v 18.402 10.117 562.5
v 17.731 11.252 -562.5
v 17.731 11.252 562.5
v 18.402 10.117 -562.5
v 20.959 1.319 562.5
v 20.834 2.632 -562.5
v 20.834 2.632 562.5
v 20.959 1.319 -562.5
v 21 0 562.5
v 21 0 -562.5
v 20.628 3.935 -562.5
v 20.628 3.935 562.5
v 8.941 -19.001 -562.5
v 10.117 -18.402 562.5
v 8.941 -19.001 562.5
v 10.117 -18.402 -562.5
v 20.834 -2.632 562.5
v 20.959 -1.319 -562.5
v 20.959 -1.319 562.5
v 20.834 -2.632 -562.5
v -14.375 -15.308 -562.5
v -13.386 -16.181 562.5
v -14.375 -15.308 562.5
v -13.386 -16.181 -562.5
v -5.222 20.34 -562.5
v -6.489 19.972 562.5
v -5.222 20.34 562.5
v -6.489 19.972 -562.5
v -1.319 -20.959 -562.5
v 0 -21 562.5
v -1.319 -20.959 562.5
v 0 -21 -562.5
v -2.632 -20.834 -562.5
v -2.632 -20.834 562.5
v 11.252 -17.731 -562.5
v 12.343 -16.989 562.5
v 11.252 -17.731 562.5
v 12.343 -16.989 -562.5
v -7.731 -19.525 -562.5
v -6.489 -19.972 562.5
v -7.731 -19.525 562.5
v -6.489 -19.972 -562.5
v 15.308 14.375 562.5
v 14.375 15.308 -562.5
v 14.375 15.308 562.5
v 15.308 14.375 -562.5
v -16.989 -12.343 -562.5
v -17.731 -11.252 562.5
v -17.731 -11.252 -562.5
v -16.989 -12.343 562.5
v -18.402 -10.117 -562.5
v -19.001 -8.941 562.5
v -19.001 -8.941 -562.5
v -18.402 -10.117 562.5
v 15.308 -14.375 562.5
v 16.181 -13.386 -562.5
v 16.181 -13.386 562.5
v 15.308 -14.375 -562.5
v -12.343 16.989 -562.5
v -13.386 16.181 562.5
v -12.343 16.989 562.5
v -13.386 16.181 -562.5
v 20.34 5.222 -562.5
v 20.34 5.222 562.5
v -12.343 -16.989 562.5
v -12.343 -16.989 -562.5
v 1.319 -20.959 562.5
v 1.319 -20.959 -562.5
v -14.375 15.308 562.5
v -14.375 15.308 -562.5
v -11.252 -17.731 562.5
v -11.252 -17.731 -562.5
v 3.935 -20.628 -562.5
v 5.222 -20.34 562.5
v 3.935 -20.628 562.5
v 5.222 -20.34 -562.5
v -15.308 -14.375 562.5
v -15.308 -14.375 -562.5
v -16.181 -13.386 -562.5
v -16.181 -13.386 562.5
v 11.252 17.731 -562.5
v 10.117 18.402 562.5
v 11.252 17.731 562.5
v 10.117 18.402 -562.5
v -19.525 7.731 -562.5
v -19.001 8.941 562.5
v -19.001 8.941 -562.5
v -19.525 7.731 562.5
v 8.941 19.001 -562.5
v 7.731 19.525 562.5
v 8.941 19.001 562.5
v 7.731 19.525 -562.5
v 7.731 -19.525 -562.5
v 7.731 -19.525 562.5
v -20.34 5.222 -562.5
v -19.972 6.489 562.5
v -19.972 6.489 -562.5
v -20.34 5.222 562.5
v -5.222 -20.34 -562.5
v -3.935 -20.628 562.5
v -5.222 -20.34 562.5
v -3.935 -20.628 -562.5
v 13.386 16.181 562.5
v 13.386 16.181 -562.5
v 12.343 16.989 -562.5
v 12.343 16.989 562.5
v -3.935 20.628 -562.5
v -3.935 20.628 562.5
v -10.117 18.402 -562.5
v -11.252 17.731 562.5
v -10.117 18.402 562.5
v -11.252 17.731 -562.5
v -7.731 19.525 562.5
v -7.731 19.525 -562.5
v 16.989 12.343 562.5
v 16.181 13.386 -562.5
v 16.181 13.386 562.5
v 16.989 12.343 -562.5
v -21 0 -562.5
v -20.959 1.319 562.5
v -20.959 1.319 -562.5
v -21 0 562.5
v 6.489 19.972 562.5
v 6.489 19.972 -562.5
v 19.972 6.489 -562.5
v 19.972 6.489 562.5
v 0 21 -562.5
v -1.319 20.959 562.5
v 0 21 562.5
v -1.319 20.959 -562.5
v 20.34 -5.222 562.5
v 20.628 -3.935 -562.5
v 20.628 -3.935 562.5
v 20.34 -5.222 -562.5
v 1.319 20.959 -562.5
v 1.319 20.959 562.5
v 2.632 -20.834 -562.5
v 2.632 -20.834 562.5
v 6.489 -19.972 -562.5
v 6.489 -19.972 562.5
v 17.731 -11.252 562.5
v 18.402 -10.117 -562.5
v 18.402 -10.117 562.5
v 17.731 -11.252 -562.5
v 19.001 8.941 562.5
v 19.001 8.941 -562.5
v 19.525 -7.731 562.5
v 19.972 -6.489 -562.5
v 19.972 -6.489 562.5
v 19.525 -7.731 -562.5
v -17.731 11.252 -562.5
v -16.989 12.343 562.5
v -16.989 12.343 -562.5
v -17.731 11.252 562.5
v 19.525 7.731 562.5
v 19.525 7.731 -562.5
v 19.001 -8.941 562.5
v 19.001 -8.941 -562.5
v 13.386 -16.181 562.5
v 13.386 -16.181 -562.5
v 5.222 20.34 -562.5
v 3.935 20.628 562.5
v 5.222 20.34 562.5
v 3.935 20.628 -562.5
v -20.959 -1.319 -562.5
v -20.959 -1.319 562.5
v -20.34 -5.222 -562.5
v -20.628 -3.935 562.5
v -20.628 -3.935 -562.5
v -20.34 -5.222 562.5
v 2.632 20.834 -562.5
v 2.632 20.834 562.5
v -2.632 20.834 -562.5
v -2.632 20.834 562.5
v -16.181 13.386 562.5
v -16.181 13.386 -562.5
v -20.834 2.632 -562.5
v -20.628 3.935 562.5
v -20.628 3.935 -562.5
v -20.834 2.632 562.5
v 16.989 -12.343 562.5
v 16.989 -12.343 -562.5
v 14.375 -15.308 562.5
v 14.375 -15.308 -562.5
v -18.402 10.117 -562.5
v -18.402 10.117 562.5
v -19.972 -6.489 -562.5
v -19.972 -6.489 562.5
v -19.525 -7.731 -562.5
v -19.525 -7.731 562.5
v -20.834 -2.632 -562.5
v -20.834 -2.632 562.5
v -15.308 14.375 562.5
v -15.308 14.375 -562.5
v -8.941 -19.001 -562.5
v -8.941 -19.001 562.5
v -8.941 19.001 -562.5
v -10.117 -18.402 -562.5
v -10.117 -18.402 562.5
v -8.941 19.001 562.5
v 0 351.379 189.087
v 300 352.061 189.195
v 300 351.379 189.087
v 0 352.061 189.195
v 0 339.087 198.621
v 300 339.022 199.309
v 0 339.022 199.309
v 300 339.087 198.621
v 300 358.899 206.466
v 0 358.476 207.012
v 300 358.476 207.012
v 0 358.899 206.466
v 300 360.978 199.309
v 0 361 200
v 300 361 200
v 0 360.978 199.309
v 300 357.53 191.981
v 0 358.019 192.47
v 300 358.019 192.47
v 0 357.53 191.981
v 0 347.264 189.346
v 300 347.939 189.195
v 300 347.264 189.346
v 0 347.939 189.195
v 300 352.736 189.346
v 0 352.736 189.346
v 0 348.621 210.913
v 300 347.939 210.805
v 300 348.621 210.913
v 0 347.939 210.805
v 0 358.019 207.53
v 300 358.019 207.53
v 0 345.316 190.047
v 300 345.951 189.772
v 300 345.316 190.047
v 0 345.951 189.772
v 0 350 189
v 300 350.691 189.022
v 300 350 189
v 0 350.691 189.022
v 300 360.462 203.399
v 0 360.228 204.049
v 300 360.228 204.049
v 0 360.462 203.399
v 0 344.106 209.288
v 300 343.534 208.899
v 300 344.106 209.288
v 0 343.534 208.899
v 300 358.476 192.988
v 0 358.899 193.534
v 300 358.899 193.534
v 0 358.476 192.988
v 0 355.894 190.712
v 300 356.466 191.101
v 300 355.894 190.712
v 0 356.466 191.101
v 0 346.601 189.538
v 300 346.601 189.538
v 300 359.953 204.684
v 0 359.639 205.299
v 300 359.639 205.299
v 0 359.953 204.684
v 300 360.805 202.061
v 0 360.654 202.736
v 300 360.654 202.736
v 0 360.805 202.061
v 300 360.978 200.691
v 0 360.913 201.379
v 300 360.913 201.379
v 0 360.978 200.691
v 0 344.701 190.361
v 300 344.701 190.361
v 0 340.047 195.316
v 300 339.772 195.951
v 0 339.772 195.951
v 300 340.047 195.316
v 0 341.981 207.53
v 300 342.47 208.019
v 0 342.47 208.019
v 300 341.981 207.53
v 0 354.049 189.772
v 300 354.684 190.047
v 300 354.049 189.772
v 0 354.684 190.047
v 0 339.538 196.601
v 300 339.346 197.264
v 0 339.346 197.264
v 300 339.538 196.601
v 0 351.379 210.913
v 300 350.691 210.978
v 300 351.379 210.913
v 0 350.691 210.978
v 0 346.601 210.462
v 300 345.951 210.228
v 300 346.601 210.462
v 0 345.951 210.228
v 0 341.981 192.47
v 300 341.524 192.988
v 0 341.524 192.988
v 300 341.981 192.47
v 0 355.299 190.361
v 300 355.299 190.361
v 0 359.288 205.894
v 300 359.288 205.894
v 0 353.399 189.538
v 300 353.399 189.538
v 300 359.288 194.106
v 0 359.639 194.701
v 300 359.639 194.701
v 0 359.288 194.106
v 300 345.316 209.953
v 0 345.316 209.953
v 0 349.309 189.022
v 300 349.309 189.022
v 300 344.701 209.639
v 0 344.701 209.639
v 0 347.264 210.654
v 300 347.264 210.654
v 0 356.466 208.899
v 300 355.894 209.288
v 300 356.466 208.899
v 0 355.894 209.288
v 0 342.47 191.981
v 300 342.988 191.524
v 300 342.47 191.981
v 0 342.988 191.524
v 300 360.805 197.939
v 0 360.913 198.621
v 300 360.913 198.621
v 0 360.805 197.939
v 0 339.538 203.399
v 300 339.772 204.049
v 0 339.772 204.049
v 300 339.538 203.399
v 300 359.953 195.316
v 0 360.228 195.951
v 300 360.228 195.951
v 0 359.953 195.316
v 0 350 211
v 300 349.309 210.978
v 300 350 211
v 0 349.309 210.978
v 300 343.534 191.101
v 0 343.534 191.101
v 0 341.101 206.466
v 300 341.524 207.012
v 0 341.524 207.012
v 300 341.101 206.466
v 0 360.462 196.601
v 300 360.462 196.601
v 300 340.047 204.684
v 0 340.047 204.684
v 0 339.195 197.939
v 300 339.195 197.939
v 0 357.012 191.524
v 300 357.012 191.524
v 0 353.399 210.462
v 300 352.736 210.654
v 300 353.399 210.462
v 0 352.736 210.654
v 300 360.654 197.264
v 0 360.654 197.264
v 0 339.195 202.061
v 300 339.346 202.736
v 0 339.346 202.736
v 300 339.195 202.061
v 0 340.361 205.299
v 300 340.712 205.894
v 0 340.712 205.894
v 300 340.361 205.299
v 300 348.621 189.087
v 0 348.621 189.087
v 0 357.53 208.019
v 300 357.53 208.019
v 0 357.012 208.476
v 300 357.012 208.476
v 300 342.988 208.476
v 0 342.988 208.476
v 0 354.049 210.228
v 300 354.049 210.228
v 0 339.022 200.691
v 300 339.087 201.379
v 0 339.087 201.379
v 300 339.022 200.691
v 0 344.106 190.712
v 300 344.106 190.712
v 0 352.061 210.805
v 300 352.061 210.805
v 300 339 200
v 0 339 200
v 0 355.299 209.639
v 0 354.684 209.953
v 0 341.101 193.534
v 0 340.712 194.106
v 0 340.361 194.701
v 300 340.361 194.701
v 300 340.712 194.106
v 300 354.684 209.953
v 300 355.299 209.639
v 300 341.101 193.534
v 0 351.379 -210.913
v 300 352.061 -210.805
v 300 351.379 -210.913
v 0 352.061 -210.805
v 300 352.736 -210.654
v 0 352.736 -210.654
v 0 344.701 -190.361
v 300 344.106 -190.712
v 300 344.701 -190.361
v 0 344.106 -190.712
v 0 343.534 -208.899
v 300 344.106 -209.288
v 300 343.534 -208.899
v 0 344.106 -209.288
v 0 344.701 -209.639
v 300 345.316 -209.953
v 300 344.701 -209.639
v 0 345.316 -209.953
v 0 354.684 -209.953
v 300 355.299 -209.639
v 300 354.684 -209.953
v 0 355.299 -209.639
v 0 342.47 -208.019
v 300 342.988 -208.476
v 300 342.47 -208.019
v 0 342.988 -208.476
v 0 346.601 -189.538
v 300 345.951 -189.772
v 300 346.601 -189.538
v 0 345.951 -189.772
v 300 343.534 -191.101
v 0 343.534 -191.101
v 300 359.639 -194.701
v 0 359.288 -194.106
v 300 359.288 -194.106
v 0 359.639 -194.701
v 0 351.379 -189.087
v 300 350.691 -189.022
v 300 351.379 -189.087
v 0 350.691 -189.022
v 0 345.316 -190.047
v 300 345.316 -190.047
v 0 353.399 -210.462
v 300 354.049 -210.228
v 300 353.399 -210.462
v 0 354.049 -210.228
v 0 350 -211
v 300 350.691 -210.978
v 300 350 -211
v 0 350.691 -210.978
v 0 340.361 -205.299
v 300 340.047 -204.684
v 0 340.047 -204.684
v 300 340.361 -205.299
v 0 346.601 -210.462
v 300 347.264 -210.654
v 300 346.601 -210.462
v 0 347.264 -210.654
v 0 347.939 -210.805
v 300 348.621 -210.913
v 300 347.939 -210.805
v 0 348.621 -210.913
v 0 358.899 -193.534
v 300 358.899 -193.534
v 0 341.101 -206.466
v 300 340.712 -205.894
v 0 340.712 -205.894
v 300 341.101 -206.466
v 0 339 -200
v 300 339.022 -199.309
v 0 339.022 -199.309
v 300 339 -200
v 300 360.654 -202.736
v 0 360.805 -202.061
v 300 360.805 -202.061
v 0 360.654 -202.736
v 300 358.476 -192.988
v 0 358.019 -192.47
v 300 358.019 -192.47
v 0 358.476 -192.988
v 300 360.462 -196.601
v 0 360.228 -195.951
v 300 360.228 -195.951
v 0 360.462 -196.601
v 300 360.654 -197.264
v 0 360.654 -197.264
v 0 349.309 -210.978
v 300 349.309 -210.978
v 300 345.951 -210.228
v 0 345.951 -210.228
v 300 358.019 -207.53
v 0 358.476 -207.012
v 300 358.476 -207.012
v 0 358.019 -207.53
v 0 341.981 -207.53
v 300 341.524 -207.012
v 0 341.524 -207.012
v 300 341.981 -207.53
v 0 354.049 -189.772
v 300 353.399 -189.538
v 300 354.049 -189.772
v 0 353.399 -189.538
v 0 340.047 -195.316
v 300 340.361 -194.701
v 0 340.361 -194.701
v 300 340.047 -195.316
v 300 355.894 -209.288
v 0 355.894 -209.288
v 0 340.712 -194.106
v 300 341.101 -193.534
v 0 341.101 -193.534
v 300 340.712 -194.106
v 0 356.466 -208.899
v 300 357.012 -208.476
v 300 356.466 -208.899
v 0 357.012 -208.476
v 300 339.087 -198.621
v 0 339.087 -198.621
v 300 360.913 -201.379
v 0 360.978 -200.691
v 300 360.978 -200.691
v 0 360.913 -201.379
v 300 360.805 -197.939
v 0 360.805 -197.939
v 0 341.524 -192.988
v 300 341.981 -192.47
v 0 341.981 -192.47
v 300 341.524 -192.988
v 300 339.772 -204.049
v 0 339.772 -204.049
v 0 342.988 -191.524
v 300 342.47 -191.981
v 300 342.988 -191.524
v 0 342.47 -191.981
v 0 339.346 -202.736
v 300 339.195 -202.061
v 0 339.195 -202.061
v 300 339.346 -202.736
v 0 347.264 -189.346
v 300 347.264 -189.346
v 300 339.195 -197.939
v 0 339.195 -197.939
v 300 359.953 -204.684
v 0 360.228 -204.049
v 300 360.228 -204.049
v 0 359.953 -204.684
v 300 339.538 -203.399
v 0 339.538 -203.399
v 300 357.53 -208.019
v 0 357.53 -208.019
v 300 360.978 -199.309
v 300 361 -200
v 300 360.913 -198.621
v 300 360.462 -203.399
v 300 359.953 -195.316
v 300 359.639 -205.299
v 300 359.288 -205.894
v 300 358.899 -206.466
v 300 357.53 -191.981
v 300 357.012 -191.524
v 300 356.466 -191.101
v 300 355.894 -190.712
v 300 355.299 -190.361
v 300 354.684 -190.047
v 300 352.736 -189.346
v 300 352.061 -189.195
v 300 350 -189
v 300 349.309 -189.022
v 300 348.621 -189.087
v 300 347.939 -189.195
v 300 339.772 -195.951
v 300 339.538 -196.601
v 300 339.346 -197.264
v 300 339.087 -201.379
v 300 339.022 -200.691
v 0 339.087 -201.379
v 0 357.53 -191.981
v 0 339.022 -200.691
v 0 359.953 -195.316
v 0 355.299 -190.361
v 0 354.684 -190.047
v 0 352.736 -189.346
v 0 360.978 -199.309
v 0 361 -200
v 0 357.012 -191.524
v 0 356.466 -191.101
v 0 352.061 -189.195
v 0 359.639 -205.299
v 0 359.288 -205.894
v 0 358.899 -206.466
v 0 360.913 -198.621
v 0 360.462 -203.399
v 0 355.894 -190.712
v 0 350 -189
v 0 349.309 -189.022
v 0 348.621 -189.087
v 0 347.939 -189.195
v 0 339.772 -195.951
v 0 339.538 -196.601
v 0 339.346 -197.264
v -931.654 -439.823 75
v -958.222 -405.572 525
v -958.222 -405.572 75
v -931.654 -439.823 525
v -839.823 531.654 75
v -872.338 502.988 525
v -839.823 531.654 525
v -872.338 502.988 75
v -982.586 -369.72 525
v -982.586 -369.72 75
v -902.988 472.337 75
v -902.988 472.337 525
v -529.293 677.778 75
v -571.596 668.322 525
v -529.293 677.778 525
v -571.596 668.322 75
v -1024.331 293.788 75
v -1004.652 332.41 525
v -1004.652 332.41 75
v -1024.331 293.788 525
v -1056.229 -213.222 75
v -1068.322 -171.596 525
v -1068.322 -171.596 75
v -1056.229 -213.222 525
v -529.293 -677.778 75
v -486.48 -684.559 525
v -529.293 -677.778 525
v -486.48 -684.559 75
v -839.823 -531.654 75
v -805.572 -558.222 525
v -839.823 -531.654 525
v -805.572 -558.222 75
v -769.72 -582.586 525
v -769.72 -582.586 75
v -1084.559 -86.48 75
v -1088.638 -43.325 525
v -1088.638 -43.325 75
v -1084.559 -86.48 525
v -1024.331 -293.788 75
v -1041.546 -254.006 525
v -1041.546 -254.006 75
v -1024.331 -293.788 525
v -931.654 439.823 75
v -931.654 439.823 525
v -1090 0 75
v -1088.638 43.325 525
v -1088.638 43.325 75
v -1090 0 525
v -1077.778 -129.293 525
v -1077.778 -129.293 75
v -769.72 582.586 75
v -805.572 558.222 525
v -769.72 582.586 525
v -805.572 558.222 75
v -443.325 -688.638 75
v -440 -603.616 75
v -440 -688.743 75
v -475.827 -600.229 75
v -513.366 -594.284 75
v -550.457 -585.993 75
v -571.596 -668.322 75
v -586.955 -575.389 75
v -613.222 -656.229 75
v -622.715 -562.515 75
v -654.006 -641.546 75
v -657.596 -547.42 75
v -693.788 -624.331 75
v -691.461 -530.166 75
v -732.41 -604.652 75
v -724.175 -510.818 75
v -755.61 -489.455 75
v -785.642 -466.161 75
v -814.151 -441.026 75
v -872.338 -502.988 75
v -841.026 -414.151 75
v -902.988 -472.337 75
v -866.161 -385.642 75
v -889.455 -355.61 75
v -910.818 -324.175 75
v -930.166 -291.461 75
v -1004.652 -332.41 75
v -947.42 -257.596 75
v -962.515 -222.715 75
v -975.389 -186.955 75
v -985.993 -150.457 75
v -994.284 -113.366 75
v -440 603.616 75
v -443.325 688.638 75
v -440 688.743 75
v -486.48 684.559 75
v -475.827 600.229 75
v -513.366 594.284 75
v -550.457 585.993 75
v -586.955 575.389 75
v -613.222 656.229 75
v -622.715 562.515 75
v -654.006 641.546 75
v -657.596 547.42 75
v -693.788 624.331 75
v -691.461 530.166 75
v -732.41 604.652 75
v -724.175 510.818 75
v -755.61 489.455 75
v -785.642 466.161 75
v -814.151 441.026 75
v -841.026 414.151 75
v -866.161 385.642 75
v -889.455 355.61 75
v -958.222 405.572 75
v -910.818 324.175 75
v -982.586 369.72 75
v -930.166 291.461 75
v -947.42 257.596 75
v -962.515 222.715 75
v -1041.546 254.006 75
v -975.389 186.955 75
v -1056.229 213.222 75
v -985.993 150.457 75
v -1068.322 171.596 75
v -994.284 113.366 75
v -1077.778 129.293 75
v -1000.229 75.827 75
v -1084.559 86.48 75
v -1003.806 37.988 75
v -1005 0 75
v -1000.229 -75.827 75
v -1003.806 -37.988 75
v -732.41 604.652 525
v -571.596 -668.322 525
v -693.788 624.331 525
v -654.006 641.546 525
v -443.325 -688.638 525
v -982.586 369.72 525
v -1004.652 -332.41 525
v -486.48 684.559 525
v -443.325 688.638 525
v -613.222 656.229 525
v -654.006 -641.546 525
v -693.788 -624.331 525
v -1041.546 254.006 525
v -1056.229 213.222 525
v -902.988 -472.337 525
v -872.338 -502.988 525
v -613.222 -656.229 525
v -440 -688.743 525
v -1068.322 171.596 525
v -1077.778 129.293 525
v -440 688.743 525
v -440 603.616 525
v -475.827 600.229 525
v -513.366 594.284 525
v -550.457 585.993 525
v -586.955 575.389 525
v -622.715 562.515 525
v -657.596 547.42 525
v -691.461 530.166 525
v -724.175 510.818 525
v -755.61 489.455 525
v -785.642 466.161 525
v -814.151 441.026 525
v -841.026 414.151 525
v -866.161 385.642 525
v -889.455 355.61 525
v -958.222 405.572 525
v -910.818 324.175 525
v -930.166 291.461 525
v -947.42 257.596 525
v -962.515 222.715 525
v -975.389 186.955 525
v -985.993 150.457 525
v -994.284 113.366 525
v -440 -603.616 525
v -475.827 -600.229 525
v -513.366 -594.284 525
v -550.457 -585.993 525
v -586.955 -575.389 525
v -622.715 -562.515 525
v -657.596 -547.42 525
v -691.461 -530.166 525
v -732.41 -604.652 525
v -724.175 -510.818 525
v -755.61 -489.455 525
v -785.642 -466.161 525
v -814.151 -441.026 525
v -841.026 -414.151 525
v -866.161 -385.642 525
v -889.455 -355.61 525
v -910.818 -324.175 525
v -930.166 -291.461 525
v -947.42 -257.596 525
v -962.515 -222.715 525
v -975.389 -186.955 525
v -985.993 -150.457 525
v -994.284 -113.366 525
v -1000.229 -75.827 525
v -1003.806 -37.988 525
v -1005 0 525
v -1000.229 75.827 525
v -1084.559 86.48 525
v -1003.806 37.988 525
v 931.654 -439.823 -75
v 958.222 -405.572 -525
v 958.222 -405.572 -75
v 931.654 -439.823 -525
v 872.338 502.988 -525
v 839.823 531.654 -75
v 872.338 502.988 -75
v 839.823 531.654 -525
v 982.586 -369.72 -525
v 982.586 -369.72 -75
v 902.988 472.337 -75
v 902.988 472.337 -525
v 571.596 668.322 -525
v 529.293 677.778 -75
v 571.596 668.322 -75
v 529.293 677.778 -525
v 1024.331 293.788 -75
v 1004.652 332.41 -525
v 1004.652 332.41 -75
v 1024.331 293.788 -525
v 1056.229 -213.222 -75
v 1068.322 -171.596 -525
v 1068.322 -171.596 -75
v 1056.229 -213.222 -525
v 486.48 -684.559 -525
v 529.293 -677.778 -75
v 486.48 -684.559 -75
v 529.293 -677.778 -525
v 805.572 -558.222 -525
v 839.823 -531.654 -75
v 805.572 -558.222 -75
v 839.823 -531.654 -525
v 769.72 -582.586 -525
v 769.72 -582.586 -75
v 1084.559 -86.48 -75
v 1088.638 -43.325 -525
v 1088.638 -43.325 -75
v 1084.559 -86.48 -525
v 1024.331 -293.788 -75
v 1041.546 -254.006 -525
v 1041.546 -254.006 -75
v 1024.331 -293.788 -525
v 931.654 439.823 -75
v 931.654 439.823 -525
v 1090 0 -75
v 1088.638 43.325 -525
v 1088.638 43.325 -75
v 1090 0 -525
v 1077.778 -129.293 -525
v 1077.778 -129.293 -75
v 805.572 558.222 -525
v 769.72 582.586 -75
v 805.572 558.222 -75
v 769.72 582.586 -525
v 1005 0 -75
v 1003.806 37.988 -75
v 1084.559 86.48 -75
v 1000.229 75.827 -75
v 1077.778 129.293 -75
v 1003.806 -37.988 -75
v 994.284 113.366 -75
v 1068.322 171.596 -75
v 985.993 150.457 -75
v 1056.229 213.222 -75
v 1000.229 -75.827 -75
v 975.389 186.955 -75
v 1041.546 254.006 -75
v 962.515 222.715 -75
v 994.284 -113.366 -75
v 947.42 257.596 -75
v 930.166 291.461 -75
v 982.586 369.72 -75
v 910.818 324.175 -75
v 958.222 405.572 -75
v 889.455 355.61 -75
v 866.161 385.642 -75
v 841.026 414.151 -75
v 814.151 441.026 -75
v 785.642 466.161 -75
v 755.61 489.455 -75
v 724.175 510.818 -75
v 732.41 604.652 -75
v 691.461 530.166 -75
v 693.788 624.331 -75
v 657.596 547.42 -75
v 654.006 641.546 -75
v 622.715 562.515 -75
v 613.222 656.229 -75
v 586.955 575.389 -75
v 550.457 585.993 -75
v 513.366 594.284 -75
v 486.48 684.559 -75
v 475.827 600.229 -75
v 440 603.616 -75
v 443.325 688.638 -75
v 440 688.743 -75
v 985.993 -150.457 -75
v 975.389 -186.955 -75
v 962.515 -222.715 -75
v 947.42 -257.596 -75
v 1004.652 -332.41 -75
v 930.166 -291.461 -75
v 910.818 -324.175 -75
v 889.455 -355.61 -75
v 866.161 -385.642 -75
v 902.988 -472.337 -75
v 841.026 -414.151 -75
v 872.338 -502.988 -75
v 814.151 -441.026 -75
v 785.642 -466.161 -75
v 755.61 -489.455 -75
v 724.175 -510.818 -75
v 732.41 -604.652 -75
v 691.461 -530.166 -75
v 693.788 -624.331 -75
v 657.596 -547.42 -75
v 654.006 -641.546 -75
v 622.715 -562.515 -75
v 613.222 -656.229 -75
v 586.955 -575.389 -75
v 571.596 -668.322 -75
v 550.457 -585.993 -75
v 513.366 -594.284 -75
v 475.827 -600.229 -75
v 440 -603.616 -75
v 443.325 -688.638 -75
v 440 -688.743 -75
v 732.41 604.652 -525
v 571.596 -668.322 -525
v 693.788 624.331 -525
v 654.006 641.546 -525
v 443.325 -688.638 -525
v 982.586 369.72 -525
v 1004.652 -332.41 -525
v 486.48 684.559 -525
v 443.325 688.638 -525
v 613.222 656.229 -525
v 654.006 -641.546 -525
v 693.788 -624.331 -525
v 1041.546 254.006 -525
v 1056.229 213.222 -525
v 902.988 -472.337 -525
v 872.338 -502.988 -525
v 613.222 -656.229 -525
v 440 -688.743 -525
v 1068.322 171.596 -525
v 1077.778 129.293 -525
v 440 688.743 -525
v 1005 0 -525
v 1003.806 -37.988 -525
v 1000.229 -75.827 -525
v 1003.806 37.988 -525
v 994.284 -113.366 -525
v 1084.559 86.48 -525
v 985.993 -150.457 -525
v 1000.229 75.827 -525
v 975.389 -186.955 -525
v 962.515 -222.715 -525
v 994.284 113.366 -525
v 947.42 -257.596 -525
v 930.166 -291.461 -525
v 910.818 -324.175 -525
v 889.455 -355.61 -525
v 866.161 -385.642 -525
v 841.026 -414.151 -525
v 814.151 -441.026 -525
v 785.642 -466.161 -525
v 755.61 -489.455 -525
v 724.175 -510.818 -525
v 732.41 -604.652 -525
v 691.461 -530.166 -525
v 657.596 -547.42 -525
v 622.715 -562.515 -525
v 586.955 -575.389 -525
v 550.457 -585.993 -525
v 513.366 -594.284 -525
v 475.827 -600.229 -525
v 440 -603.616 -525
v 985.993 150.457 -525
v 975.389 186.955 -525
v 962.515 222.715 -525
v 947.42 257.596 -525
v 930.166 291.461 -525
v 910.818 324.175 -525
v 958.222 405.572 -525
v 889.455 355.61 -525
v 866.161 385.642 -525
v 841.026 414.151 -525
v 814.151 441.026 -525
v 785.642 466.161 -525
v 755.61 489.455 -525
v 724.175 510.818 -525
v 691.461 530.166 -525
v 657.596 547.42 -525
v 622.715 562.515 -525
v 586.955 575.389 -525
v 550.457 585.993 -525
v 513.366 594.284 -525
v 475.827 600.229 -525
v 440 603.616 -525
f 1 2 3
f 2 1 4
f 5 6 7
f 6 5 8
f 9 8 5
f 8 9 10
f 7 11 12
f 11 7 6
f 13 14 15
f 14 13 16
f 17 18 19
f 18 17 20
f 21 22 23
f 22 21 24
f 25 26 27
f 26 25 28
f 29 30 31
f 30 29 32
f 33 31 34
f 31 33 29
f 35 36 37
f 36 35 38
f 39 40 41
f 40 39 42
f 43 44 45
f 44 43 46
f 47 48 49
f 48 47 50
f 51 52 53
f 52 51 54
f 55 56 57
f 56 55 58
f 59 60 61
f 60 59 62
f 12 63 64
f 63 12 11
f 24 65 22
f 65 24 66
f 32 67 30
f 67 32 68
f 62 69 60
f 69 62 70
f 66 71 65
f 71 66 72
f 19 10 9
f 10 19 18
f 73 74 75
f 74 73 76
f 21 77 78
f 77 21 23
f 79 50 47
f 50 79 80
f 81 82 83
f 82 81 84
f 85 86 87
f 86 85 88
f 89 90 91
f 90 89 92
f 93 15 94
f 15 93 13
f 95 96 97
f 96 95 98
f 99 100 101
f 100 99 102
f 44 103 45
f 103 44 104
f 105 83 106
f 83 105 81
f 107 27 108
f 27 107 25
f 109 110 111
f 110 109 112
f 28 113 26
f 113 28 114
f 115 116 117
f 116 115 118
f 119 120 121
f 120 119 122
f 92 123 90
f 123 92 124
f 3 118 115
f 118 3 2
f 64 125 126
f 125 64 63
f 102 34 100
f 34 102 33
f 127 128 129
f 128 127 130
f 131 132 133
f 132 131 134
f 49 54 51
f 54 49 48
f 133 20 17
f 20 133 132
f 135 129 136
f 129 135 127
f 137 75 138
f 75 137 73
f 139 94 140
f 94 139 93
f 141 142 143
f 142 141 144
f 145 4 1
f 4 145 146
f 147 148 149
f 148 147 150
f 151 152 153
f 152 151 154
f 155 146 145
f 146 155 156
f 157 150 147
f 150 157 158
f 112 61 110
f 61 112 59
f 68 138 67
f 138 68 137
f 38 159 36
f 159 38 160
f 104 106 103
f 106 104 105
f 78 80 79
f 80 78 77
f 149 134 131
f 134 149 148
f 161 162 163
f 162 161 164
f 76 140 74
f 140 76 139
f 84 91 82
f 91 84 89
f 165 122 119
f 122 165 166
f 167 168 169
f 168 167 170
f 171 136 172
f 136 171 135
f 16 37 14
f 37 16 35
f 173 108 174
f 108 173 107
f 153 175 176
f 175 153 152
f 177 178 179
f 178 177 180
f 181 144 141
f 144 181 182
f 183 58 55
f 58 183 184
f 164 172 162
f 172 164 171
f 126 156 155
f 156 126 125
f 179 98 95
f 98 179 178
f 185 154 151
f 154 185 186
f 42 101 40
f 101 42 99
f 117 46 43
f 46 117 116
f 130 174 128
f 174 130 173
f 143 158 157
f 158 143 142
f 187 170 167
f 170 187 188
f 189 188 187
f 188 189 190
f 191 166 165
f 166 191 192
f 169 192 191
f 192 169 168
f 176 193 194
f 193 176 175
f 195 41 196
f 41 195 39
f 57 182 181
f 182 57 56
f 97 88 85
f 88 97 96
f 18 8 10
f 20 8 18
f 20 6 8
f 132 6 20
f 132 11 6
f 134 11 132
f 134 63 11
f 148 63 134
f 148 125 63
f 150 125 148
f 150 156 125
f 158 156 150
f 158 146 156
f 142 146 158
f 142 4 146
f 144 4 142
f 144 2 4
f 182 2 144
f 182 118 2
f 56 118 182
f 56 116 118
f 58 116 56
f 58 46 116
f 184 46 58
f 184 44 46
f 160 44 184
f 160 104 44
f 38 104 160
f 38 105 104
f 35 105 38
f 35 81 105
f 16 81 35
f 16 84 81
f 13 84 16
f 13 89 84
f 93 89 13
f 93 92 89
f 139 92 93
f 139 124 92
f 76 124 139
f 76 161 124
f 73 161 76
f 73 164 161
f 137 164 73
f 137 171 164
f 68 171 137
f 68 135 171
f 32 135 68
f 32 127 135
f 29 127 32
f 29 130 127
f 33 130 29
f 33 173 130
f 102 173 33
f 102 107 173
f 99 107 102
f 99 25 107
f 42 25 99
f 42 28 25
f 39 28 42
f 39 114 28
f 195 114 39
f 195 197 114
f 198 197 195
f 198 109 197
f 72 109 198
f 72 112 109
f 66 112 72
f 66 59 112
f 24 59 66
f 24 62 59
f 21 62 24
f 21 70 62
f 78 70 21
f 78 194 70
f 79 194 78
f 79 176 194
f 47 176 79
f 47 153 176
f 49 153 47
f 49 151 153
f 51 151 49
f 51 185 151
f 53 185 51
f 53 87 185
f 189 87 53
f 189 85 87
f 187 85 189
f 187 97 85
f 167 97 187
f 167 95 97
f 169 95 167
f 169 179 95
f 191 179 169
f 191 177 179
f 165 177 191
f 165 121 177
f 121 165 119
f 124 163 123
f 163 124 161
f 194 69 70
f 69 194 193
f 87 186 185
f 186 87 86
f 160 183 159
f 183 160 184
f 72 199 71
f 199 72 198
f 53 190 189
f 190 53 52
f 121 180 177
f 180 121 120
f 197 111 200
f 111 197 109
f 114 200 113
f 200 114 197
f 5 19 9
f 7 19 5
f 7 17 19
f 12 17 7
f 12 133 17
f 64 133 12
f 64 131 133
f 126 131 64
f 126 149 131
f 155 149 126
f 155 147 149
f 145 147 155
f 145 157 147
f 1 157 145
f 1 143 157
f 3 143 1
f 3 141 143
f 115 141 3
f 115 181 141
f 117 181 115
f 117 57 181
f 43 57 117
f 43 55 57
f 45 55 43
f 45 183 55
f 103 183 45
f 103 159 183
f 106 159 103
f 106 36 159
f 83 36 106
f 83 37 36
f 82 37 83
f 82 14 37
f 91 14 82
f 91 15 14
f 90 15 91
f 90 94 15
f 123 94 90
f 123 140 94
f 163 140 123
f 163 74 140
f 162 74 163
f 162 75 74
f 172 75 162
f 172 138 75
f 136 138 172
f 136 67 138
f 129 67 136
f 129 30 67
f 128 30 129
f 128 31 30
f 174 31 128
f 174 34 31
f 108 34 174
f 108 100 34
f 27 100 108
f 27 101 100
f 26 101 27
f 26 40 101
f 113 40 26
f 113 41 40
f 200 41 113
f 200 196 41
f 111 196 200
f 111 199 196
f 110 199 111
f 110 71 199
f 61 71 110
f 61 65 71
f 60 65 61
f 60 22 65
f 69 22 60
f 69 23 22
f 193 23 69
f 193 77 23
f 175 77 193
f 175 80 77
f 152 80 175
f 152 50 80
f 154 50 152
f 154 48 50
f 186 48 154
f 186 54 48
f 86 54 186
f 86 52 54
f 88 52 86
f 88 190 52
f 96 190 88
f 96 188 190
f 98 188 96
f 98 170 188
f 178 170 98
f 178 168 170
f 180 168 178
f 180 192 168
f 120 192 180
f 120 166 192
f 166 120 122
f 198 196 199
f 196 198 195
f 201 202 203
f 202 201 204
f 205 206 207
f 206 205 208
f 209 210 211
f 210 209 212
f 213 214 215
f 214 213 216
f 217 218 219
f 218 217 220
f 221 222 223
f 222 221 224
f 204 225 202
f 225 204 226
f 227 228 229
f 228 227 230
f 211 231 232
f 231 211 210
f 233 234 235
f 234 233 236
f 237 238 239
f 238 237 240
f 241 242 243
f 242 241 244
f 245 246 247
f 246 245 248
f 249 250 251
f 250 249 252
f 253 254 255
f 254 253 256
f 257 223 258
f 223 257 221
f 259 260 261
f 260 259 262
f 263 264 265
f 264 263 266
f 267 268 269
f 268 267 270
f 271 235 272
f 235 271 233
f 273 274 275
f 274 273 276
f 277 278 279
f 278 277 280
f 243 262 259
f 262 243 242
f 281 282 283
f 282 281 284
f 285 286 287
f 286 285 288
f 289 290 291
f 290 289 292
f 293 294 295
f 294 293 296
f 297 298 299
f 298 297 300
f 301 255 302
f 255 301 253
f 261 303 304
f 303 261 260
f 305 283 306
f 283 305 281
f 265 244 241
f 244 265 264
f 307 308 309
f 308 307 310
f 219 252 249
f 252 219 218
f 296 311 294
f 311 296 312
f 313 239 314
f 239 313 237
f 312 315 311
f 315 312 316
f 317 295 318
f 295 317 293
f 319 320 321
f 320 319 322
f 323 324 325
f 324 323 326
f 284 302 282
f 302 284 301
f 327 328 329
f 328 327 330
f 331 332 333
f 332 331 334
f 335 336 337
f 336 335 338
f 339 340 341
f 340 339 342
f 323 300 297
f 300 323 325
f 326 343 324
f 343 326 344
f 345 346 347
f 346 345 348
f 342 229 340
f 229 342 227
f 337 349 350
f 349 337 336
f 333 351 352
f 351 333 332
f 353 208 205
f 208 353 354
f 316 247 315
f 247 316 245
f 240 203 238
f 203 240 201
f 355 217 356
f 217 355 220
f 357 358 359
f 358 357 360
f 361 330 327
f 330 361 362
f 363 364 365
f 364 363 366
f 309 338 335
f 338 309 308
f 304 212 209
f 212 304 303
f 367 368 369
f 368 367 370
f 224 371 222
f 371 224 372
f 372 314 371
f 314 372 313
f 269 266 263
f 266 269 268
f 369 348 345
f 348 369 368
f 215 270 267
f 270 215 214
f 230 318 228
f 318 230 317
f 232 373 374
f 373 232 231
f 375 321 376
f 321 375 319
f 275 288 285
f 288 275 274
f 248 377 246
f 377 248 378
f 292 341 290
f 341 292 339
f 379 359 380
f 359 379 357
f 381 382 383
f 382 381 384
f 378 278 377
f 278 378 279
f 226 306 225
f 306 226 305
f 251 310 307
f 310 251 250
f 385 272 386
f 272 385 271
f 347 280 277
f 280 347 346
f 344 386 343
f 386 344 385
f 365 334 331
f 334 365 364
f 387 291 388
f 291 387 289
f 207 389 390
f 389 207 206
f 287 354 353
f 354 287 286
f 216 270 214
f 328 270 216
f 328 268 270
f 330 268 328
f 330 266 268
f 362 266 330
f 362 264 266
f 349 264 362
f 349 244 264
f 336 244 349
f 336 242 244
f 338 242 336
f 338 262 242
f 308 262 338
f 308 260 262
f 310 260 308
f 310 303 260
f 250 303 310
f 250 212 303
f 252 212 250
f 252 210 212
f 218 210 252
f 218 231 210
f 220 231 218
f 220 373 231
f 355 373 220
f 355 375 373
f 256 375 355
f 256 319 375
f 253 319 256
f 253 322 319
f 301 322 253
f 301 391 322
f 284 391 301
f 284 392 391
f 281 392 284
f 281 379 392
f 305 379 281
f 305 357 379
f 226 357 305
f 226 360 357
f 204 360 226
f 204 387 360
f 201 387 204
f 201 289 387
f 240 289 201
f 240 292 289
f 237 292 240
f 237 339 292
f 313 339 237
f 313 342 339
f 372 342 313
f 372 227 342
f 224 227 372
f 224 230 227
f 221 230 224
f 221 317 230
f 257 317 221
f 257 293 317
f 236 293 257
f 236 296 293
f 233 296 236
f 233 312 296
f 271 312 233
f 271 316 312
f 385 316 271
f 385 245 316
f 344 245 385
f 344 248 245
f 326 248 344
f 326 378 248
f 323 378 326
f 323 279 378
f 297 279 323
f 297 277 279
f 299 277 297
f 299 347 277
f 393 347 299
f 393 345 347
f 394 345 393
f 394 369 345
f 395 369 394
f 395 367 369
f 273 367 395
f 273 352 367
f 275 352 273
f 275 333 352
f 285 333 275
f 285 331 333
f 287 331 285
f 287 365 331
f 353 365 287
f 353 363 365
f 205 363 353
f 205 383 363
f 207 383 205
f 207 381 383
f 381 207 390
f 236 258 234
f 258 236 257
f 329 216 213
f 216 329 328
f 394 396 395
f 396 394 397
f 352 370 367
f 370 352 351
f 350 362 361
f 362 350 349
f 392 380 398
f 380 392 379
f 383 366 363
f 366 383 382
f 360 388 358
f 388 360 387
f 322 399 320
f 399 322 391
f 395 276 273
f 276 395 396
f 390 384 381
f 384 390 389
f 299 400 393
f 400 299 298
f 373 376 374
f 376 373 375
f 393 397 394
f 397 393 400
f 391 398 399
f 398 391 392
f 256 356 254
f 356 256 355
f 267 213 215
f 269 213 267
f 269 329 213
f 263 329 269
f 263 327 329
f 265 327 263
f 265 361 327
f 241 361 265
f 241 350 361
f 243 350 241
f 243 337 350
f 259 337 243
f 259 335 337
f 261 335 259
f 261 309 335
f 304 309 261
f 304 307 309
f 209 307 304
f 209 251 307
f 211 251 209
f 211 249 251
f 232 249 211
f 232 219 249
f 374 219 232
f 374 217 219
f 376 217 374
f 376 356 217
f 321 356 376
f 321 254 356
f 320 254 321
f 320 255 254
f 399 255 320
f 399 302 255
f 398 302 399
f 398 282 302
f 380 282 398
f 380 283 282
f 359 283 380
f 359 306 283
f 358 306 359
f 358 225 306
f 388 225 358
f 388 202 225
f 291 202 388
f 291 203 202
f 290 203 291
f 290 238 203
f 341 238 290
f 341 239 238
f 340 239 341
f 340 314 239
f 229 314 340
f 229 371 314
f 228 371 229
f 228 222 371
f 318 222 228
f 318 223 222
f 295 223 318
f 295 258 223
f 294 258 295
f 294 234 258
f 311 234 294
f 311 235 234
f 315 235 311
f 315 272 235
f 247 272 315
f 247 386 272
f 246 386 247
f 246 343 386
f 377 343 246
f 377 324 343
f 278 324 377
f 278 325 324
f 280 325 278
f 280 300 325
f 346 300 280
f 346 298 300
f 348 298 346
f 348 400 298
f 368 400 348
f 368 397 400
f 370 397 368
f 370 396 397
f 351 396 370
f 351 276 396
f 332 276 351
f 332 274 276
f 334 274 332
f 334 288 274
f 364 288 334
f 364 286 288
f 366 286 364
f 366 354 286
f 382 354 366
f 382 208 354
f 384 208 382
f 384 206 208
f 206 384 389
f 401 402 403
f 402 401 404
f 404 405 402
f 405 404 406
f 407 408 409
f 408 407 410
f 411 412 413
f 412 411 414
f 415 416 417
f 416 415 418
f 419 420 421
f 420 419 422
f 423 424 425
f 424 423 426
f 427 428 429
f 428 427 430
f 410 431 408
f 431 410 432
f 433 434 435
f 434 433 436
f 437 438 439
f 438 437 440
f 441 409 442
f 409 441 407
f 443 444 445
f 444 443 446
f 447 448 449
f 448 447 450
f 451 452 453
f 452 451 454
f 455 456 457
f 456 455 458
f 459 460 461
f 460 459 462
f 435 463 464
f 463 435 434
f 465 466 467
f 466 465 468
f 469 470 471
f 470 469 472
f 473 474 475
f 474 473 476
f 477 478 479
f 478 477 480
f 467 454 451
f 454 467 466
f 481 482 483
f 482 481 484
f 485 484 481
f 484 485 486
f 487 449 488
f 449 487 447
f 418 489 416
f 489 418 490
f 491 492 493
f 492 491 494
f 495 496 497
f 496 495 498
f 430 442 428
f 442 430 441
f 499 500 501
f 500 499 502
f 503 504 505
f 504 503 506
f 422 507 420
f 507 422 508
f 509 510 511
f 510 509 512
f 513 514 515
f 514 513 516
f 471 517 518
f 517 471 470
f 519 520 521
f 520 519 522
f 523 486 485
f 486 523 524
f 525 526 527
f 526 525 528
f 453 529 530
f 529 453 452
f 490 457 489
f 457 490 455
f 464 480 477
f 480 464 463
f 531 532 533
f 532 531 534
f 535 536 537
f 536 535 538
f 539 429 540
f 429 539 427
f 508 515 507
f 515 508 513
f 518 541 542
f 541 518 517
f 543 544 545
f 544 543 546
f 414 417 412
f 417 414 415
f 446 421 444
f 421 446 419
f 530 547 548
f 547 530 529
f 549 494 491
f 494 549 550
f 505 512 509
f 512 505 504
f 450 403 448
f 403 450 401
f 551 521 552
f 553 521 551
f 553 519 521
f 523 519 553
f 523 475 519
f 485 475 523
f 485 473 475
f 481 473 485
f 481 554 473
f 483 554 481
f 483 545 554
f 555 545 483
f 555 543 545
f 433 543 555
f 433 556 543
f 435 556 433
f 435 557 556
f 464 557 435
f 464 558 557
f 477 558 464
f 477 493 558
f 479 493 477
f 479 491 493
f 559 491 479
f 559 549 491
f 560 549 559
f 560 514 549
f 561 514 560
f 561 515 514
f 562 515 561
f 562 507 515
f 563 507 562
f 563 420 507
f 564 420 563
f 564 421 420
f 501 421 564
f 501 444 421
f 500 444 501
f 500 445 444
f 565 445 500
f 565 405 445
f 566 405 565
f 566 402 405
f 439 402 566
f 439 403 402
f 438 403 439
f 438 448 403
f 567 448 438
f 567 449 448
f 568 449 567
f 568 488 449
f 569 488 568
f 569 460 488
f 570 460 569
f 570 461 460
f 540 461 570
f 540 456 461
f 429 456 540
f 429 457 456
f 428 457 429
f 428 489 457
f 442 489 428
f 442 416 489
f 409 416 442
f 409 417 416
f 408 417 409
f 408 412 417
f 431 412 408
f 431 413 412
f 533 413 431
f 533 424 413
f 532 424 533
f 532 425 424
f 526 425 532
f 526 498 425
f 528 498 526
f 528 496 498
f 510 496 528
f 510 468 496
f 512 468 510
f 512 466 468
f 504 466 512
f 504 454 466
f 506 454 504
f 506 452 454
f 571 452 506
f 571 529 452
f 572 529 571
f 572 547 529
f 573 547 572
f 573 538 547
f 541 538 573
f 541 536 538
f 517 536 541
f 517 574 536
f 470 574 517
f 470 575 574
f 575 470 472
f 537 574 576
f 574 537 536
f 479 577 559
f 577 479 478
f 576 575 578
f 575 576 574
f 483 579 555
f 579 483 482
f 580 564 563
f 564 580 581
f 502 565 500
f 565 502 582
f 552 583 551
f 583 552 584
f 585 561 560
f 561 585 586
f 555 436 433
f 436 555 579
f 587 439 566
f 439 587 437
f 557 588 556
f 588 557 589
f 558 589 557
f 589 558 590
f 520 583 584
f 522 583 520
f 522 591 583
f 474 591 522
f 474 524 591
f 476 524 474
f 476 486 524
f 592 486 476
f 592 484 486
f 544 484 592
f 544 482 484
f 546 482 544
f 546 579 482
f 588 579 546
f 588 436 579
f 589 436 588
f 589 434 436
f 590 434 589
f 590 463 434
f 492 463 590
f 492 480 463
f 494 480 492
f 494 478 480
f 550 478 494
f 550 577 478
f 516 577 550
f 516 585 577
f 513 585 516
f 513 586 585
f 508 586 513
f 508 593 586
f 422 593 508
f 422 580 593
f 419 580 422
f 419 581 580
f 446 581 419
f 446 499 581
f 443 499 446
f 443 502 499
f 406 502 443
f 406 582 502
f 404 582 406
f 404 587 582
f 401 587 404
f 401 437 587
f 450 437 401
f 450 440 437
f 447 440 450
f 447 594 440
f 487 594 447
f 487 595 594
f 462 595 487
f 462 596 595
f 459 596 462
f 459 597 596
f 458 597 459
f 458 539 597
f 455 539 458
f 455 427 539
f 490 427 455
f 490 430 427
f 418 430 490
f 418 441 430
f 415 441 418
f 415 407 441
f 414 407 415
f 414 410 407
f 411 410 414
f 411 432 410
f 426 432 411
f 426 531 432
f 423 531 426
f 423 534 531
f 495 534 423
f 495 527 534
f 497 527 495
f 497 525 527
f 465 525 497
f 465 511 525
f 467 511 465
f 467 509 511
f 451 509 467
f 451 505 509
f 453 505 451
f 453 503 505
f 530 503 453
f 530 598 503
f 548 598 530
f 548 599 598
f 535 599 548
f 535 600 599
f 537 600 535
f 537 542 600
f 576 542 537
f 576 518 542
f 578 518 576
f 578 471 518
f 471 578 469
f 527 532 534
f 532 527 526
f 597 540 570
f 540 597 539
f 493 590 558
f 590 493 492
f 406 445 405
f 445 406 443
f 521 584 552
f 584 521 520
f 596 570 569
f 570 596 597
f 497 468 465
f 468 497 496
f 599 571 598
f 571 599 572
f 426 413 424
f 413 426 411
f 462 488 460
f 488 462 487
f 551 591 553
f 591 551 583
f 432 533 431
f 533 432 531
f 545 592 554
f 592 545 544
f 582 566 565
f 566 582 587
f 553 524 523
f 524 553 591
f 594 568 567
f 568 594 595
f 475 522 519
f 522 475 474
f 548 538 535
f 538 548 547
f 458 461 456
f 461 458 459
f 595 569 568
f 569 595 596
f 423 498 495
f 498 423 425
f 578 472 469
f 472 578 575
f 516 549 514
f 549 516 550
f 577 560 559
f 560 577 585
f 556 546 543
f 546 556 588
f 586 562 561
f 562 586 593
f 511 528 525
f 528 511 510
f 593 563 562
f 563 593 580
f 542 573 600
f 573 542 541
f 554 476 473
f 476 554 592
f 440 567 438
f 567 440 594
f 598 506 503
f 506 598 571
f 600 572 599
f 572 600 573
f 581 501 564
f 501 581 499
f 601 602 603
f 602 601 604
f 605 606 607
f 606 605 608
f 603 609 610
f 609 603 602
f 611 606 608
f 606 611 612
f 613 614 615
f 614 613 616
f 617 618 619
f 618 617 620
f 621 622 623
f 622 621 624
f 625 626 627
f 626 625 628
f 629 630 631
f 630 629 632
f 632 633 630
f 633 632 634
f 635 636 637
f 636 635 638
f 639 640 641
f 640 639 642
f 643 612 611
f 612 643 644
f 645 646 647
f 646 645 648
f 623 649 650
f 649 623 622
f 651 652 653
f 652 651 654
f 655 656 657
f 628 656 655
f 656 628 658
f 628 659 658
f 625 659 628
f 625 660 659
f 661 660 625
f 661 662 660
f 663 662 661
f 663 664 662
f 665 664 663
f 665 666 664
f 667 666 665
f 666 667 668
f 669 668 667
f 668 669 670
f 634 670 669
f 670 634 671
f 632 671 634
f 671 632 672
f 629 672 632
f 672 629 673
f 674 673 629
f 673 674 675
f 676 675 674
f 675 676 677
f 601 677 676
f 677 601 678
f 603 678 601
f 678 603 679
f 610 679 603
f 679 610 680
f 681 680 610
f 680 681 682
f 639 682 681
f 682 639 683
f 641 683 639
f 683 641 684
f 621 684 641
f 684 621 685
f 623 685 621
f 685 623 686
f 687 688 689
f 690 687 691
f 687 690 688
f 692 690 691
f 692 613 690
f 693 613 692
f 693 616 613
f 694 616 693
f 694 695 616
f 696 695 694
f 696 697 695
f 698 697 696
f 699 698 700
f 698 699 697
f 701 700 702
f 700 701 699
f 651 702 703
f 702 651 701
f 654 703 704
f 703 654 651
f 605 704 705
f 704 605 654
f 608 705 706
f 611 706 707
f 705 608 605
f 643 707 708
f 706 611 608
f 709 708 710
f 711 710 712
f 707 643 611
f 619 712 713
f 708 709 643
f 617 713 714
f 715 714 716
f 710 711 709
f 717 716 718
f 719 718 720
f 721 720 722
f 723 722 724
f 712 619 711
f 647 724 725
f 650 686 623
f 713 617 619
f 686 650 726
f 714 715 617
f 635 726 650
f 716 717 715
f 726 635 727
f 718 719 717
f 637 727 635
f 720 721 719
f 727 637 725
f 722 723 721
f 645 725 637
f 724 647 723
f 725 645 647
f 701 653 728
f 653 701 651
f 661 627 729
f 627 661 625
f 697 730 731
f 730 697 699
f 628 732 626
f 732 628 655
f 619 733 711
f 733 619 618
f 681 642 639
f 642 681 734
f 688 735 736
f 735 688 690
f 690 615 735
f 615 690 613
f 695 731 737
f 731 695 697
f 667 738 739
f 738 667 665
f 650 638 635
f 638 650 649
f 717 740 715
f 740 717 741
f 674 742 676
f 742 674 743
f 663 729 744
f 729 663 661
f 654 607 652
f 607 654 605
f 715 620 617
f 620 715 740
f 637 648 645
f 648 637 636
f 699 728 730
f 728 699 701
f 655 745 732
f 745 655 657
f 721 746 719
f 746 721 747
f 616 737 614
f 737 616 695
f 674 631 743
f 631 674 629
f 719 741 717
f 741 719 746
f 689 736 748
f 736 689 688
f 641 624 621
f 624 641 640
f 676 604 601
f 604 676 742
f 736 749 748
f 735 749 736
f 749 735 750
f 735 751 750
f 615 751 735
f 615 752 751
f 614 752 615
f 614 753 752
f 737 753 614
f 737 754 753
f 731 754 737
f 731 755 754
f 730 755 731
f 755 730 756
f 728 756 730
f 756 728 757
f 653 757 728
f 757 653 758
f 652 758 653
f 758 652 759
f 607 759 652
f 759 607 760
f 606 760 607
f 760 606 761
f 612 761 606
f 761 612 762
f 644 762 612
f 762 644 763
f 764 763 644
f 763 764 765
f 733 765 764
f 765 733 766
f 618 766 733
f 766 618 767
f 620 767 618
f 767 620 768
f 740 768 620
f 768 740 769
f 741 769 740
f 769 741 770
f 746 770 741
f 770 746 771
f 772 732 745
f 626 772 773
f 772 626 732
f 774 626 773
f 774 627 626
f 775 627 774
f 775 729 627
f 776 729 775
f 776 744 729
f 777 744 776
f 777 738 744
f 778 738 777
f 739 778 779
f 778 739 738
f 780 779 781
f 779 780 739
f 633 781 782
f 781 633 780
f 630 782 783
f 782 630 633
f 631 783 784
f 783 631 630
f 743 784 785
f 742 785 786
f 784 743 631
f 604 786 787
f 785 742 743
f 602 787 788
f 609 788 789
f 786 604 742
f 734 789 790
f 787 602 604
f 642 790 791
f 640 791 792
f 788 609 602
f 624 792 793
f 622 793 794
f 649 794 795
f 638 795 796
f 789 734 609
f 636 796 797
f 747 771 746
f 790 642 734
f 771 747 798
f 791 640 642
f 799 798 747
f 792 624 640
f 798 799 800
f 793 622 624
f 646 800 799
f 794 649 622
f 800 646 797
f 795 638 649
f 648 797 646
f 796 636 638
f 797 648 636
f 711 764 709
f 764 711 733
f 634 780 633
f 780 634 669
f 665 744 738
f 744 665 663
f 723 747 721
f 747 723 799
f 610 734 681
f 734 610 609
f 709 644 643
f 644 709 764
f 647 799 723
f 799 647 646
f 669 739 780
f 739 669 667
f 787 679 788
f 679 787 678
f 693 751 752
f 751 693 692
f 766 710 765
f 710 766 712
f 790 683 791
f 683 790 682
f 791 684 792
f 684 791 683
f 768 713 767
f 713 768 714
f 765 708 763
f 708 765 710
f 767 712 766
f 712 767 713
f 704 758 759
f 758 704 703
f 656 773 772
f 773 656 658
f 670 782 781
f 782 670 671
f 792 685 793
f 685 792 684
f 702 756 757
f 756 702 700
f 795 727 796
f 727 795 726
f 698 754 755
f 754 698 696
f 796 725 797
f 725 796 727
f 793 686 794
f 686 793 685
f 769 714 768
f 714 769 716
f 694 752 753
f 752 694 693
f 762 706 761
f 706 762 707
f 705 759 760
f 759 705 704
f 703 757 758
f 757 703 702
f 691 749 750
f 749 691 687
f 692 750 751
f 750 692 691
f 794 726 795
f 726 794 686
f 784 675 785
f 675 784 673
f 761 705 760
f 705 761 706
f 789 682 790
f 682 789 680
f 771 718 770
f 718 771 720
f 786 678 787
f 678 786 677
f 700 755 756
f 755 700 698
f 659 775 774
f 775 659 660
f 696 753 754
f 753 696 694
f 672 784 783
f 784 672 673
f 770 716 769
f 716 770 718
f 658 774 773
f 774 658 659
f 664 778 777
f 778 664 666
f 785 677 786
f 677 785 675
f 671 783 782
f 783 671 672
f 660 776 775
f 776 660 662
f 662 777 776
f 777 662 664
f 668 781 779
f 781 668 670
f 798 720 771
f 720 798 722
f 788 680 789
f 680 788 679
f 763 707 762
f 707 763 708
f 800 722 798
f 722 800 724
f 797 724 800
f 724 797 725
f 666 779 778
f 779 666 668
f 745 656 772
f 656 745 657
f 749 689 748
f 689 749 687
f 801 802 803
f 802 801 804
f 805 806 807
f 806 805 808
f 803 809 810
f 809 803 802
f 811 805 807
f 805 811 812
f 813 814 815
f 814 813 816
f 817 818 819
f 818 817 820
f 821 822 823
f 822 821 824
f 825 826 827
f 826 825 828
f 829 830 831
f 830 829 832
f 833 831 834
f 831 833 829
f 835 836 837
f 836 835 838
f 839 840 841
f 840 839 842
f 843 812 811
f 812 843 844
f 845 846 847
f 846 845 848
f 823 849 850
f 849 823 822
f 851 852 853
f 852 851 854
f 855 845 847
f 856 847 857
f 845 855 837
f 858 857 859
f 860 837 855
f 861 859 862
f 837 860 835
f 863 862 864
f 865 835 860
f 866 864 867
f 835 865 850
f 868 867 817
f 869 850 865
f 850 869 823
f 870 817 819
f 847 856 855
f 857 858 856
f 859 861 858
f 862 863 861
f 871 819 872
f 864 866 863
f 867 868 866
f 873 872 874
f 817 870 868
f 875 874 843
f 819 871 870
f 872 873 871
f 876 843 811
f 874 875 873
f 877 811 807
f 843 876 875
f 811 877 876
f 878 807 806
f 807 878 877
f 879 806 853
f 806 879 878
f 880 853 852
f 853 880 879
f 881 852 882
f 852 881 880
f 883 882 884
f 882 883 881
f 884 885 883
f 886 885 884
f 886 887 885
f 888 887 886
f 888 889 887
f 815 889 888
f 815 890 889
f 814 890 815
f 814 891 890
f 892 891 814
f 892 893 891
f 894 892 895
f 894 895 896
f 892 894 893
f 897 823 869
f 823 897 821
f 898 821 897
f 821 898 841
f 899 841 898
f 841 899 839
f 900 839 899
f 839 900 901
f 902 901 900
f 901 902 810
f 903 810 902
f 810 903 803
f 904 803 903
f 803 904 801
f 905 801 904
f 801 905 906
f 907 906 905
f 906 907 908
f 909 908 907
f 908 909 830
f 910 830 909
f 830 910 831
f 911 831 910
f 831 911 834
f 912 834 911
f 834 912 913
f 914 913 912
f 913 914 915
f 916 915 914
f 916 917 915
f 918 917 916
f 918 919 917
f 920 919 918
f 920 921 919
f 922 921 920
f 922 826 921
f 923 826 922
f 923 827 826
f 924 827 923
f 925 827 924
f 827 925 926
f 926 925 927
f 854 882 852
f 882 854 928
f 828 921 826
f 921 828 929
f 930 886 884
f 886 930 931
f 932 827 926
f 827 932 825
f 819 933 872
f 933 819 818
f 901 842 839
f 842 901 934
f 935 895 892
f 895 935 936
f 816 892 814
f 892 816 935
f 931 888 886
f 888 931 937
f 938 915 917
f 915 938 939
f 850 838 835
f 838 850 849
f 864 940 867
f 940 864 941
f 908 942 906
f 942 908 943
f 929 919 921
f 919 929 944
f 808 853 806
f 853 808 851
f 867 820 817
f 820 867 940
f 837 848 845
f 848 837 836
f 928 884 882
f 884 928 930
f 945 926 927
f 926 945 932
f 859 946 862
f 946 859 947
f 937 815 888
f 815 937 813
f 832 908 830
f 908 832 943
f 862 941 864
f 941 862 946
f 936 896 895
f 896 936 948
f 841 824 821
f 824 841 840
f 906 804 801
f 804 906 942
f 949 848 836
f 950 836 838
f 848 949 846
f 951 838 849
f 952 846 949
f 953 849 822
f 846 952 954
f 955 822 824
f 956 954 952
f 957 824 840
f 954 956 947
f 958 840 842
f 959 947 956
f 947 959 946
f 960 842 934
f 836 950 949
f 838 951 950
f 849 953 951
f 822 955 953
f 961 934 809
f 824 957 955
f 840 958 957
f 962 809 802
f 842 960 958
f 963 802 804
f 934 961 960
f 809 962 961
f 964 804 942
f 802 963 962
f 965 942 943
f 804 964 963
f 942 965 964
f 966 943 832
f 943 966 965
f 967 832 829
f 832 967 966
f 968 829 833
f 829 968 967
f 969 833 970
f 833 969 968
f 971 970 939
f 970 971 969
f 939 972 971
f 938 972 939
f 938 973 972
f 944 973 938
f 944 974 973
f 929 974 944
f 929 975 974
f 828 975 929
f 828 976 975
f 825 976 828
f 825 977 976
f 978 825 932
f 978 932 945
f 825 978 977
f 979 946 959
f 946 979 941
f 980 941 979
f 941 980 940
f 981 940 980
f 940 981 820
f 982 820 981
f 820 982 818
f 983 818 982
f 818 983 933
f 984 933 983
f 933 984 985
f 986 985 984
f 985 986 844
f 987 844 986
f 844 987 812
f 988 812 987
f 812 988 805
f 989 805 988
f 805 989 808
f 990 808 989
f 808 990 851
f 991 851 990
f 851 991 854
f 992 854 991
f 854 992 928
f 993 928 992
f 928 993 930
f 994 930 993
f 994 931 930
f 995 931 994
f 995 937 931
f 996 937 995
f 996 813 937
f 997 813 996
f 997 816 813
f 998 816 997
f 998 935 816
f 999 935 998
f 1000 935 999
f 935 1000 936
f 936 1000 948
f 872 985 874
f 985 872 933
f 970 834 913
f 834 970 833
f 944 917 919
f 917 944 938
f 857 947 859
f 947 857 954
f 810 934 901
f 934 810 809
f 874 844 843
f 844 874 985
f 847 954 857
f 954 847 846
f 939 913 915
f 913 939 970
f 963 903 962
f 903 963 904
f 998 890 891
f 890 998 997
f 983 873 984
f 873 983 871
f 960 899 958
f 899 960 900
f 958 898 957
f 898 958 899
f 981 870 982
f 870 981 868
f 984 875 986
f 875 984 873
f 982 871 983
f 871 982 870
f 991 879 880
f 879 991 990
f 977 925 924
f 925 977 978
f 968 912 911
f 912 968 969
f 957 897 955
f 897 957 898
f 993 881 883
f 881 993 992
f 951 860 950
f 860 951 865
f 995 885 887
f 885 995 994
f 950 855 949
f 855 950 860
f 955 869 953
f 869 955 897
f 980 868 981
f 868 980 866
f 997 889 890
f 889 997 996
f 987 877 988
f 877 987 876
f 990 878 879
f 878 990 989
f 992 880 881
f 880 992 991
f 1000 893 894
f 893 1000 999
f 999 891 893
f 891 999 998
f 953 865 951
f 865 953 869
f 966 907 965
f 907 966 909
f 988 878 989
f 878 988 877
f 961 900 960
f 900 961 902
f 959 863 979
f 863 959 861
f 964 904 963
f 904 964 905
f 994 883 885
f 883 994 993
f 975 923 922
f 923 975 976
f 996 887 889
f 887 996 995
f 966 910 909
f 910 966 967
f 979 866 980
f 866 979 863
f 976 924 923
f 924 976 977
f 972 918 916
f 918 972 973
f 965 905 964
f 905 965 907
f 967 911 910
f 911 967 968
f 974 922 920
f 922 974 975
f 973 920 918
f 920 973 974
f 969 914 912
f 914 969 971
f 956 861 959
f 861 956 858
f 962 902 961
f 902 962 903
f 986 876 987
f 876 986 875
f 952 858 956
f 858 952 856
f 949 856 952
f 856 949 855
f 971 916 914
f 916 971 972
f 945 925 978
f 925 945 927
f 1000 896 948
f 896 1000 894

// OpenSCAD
// ============================================================================
// PROJECT: XXXG-00W0 WING GUNDAM ZERO EW - LOWER TORSO REBALANCING MATRIX
// COMPONENT VAULT: BANDAI CAST RUNNER A - PELVIC JOINT CAPS A3 & A4
// REBALANCING SPEC: TORSIONAL SUPPORT FOR INTENSE HIGH-SPEED ARM MOVEMENTS
// PARITY INTERFACE: SOLID-STATE TERMINAL SOCKETS FOR SQUARE-WAVE RETROFITTING
// ============================================================================

$fn = 100; // Circular segment resolution calculation count

// Sizing Constants Scaled 1:1 for a 16.7-Meter Airframe Scale (mm)
pelvic_cap_diameter = 1380;             // Total horizontal width of cap housing (mm)
pelvic_cap_height = 450;                // Vertical longitudinal thickness (mm)
armor_shield_wall = 85;                 // Thick TiAl reinforcing plate thickness (mm)
harness_conduit_width = 80;             // Cast-in 4oz copper logic trace track (mm)
terminal_socket_width = 240;            // Solid-state multi-mux junction box (mm)

module Runner_A_Cap_Forge() {
    // Central Supply Injection Runner Axis (Molten Feed Line from Siphon Forge)
    color([0.22, 0.22, 0.25]) {
        cylinder(h = pelvic_cap_height * 2.5, d = 42, center = true);
        // Direct feed gates tracking straight into the part mold cavities
        translate([0, 350, 200]) rotate([0, 90, 0]) cylinder(h = 300, d = 22);
        translate([0, 350, -200]) rotate([0, 90, 0]) cylinder(h = 300, d = 22);
    }
    
    // Instantiate Scaled Skeutomorphic Part Molds Symmetrically (Left & Right)
    Cast_Pelvic_Cap_Components();
}

module Cast_Pelvic_Cap_Components() {
    // ---- PART A3: LOWER TORSO PELVIC JOINT CAP (LEFT COMPONENT) ---- [Page 6, Step 1]
    translate([-400, 0, 300]) color([0.7, 0.7, 0.74]) {
        difference() {
            // Main high-strength structural cap ring quadrant
            cylinder(h = pelvic_cap_height, d = pelvic_cap_diameter, center = true);
            
            // Internal pocket clearance (Bores out weight while leaving 85mm walls)
            cylinder(h = pelvic_cap_height + 20, d = pelvic_cap_diameter - (armor_shield_wall * 2), center = true);
            
            // Integrated Solid-State Wire Harness Terminal Socket Pocket
            translate([0, -(pelvic_cap_diameter/4), 0])
                cube([terminal_socket_width, terminal_socket_width, pelvic_cap_height + 10], center = true);
                
            // Continuous cast-in guide track for the 4oz copper logic rail bus
            cube([harness_conduit_width, pelvic_cap_diameter + 10, pelvic_cap_height + 20], center = true);
            
            // Slicing tool to generate an asymmetrical half-shell mating part
            translate([pelvic_cap_diameter/2, 0, 0])
                cube([pelvic_cap_diameter, pelvic_cap_diameter * 2, pelvic_cap_height * 2], center = true);
        }
    }
    
    // ---- PART A4: LOWER TORSO PELVIC JOINT CAP (RIGHT COMPONENT) ---- [Page 6, Step 1]
    translate([400, 0, -300]) rotate([0, 180, 0]) color([0.7, 0.7, 0.74]) {
        difference() {
            cylinder(h = pelvic_cap_height, d = pelvic_cap_diameter, center = true);
            cylinder(h = pelvic_cap_height + 20, d = pelvic_cap_diameter - (armor_shield_wall * 2), center = true);
            translate([0, -(pelvic_cap_diameter/4), 0])
                cube([terminal_socket_width, terminal_socket_width, pelvic_cap_height + 10], center = true);
            cube([harness_conduit_width, pelvic_cap_diameter + 10, pelvic_cap_height + 20], center = true);
            translate([pelvic_cap_diameter/2, 0, 0])
                cube([pelvic_cap_diameter, pelvic_cap_diameter * 2, pelvic_cap_height * 2], center = true);
        }
    }
}

// Render Master Assembly to Parameter Workspace
Runner_A_Cap_Forge();
